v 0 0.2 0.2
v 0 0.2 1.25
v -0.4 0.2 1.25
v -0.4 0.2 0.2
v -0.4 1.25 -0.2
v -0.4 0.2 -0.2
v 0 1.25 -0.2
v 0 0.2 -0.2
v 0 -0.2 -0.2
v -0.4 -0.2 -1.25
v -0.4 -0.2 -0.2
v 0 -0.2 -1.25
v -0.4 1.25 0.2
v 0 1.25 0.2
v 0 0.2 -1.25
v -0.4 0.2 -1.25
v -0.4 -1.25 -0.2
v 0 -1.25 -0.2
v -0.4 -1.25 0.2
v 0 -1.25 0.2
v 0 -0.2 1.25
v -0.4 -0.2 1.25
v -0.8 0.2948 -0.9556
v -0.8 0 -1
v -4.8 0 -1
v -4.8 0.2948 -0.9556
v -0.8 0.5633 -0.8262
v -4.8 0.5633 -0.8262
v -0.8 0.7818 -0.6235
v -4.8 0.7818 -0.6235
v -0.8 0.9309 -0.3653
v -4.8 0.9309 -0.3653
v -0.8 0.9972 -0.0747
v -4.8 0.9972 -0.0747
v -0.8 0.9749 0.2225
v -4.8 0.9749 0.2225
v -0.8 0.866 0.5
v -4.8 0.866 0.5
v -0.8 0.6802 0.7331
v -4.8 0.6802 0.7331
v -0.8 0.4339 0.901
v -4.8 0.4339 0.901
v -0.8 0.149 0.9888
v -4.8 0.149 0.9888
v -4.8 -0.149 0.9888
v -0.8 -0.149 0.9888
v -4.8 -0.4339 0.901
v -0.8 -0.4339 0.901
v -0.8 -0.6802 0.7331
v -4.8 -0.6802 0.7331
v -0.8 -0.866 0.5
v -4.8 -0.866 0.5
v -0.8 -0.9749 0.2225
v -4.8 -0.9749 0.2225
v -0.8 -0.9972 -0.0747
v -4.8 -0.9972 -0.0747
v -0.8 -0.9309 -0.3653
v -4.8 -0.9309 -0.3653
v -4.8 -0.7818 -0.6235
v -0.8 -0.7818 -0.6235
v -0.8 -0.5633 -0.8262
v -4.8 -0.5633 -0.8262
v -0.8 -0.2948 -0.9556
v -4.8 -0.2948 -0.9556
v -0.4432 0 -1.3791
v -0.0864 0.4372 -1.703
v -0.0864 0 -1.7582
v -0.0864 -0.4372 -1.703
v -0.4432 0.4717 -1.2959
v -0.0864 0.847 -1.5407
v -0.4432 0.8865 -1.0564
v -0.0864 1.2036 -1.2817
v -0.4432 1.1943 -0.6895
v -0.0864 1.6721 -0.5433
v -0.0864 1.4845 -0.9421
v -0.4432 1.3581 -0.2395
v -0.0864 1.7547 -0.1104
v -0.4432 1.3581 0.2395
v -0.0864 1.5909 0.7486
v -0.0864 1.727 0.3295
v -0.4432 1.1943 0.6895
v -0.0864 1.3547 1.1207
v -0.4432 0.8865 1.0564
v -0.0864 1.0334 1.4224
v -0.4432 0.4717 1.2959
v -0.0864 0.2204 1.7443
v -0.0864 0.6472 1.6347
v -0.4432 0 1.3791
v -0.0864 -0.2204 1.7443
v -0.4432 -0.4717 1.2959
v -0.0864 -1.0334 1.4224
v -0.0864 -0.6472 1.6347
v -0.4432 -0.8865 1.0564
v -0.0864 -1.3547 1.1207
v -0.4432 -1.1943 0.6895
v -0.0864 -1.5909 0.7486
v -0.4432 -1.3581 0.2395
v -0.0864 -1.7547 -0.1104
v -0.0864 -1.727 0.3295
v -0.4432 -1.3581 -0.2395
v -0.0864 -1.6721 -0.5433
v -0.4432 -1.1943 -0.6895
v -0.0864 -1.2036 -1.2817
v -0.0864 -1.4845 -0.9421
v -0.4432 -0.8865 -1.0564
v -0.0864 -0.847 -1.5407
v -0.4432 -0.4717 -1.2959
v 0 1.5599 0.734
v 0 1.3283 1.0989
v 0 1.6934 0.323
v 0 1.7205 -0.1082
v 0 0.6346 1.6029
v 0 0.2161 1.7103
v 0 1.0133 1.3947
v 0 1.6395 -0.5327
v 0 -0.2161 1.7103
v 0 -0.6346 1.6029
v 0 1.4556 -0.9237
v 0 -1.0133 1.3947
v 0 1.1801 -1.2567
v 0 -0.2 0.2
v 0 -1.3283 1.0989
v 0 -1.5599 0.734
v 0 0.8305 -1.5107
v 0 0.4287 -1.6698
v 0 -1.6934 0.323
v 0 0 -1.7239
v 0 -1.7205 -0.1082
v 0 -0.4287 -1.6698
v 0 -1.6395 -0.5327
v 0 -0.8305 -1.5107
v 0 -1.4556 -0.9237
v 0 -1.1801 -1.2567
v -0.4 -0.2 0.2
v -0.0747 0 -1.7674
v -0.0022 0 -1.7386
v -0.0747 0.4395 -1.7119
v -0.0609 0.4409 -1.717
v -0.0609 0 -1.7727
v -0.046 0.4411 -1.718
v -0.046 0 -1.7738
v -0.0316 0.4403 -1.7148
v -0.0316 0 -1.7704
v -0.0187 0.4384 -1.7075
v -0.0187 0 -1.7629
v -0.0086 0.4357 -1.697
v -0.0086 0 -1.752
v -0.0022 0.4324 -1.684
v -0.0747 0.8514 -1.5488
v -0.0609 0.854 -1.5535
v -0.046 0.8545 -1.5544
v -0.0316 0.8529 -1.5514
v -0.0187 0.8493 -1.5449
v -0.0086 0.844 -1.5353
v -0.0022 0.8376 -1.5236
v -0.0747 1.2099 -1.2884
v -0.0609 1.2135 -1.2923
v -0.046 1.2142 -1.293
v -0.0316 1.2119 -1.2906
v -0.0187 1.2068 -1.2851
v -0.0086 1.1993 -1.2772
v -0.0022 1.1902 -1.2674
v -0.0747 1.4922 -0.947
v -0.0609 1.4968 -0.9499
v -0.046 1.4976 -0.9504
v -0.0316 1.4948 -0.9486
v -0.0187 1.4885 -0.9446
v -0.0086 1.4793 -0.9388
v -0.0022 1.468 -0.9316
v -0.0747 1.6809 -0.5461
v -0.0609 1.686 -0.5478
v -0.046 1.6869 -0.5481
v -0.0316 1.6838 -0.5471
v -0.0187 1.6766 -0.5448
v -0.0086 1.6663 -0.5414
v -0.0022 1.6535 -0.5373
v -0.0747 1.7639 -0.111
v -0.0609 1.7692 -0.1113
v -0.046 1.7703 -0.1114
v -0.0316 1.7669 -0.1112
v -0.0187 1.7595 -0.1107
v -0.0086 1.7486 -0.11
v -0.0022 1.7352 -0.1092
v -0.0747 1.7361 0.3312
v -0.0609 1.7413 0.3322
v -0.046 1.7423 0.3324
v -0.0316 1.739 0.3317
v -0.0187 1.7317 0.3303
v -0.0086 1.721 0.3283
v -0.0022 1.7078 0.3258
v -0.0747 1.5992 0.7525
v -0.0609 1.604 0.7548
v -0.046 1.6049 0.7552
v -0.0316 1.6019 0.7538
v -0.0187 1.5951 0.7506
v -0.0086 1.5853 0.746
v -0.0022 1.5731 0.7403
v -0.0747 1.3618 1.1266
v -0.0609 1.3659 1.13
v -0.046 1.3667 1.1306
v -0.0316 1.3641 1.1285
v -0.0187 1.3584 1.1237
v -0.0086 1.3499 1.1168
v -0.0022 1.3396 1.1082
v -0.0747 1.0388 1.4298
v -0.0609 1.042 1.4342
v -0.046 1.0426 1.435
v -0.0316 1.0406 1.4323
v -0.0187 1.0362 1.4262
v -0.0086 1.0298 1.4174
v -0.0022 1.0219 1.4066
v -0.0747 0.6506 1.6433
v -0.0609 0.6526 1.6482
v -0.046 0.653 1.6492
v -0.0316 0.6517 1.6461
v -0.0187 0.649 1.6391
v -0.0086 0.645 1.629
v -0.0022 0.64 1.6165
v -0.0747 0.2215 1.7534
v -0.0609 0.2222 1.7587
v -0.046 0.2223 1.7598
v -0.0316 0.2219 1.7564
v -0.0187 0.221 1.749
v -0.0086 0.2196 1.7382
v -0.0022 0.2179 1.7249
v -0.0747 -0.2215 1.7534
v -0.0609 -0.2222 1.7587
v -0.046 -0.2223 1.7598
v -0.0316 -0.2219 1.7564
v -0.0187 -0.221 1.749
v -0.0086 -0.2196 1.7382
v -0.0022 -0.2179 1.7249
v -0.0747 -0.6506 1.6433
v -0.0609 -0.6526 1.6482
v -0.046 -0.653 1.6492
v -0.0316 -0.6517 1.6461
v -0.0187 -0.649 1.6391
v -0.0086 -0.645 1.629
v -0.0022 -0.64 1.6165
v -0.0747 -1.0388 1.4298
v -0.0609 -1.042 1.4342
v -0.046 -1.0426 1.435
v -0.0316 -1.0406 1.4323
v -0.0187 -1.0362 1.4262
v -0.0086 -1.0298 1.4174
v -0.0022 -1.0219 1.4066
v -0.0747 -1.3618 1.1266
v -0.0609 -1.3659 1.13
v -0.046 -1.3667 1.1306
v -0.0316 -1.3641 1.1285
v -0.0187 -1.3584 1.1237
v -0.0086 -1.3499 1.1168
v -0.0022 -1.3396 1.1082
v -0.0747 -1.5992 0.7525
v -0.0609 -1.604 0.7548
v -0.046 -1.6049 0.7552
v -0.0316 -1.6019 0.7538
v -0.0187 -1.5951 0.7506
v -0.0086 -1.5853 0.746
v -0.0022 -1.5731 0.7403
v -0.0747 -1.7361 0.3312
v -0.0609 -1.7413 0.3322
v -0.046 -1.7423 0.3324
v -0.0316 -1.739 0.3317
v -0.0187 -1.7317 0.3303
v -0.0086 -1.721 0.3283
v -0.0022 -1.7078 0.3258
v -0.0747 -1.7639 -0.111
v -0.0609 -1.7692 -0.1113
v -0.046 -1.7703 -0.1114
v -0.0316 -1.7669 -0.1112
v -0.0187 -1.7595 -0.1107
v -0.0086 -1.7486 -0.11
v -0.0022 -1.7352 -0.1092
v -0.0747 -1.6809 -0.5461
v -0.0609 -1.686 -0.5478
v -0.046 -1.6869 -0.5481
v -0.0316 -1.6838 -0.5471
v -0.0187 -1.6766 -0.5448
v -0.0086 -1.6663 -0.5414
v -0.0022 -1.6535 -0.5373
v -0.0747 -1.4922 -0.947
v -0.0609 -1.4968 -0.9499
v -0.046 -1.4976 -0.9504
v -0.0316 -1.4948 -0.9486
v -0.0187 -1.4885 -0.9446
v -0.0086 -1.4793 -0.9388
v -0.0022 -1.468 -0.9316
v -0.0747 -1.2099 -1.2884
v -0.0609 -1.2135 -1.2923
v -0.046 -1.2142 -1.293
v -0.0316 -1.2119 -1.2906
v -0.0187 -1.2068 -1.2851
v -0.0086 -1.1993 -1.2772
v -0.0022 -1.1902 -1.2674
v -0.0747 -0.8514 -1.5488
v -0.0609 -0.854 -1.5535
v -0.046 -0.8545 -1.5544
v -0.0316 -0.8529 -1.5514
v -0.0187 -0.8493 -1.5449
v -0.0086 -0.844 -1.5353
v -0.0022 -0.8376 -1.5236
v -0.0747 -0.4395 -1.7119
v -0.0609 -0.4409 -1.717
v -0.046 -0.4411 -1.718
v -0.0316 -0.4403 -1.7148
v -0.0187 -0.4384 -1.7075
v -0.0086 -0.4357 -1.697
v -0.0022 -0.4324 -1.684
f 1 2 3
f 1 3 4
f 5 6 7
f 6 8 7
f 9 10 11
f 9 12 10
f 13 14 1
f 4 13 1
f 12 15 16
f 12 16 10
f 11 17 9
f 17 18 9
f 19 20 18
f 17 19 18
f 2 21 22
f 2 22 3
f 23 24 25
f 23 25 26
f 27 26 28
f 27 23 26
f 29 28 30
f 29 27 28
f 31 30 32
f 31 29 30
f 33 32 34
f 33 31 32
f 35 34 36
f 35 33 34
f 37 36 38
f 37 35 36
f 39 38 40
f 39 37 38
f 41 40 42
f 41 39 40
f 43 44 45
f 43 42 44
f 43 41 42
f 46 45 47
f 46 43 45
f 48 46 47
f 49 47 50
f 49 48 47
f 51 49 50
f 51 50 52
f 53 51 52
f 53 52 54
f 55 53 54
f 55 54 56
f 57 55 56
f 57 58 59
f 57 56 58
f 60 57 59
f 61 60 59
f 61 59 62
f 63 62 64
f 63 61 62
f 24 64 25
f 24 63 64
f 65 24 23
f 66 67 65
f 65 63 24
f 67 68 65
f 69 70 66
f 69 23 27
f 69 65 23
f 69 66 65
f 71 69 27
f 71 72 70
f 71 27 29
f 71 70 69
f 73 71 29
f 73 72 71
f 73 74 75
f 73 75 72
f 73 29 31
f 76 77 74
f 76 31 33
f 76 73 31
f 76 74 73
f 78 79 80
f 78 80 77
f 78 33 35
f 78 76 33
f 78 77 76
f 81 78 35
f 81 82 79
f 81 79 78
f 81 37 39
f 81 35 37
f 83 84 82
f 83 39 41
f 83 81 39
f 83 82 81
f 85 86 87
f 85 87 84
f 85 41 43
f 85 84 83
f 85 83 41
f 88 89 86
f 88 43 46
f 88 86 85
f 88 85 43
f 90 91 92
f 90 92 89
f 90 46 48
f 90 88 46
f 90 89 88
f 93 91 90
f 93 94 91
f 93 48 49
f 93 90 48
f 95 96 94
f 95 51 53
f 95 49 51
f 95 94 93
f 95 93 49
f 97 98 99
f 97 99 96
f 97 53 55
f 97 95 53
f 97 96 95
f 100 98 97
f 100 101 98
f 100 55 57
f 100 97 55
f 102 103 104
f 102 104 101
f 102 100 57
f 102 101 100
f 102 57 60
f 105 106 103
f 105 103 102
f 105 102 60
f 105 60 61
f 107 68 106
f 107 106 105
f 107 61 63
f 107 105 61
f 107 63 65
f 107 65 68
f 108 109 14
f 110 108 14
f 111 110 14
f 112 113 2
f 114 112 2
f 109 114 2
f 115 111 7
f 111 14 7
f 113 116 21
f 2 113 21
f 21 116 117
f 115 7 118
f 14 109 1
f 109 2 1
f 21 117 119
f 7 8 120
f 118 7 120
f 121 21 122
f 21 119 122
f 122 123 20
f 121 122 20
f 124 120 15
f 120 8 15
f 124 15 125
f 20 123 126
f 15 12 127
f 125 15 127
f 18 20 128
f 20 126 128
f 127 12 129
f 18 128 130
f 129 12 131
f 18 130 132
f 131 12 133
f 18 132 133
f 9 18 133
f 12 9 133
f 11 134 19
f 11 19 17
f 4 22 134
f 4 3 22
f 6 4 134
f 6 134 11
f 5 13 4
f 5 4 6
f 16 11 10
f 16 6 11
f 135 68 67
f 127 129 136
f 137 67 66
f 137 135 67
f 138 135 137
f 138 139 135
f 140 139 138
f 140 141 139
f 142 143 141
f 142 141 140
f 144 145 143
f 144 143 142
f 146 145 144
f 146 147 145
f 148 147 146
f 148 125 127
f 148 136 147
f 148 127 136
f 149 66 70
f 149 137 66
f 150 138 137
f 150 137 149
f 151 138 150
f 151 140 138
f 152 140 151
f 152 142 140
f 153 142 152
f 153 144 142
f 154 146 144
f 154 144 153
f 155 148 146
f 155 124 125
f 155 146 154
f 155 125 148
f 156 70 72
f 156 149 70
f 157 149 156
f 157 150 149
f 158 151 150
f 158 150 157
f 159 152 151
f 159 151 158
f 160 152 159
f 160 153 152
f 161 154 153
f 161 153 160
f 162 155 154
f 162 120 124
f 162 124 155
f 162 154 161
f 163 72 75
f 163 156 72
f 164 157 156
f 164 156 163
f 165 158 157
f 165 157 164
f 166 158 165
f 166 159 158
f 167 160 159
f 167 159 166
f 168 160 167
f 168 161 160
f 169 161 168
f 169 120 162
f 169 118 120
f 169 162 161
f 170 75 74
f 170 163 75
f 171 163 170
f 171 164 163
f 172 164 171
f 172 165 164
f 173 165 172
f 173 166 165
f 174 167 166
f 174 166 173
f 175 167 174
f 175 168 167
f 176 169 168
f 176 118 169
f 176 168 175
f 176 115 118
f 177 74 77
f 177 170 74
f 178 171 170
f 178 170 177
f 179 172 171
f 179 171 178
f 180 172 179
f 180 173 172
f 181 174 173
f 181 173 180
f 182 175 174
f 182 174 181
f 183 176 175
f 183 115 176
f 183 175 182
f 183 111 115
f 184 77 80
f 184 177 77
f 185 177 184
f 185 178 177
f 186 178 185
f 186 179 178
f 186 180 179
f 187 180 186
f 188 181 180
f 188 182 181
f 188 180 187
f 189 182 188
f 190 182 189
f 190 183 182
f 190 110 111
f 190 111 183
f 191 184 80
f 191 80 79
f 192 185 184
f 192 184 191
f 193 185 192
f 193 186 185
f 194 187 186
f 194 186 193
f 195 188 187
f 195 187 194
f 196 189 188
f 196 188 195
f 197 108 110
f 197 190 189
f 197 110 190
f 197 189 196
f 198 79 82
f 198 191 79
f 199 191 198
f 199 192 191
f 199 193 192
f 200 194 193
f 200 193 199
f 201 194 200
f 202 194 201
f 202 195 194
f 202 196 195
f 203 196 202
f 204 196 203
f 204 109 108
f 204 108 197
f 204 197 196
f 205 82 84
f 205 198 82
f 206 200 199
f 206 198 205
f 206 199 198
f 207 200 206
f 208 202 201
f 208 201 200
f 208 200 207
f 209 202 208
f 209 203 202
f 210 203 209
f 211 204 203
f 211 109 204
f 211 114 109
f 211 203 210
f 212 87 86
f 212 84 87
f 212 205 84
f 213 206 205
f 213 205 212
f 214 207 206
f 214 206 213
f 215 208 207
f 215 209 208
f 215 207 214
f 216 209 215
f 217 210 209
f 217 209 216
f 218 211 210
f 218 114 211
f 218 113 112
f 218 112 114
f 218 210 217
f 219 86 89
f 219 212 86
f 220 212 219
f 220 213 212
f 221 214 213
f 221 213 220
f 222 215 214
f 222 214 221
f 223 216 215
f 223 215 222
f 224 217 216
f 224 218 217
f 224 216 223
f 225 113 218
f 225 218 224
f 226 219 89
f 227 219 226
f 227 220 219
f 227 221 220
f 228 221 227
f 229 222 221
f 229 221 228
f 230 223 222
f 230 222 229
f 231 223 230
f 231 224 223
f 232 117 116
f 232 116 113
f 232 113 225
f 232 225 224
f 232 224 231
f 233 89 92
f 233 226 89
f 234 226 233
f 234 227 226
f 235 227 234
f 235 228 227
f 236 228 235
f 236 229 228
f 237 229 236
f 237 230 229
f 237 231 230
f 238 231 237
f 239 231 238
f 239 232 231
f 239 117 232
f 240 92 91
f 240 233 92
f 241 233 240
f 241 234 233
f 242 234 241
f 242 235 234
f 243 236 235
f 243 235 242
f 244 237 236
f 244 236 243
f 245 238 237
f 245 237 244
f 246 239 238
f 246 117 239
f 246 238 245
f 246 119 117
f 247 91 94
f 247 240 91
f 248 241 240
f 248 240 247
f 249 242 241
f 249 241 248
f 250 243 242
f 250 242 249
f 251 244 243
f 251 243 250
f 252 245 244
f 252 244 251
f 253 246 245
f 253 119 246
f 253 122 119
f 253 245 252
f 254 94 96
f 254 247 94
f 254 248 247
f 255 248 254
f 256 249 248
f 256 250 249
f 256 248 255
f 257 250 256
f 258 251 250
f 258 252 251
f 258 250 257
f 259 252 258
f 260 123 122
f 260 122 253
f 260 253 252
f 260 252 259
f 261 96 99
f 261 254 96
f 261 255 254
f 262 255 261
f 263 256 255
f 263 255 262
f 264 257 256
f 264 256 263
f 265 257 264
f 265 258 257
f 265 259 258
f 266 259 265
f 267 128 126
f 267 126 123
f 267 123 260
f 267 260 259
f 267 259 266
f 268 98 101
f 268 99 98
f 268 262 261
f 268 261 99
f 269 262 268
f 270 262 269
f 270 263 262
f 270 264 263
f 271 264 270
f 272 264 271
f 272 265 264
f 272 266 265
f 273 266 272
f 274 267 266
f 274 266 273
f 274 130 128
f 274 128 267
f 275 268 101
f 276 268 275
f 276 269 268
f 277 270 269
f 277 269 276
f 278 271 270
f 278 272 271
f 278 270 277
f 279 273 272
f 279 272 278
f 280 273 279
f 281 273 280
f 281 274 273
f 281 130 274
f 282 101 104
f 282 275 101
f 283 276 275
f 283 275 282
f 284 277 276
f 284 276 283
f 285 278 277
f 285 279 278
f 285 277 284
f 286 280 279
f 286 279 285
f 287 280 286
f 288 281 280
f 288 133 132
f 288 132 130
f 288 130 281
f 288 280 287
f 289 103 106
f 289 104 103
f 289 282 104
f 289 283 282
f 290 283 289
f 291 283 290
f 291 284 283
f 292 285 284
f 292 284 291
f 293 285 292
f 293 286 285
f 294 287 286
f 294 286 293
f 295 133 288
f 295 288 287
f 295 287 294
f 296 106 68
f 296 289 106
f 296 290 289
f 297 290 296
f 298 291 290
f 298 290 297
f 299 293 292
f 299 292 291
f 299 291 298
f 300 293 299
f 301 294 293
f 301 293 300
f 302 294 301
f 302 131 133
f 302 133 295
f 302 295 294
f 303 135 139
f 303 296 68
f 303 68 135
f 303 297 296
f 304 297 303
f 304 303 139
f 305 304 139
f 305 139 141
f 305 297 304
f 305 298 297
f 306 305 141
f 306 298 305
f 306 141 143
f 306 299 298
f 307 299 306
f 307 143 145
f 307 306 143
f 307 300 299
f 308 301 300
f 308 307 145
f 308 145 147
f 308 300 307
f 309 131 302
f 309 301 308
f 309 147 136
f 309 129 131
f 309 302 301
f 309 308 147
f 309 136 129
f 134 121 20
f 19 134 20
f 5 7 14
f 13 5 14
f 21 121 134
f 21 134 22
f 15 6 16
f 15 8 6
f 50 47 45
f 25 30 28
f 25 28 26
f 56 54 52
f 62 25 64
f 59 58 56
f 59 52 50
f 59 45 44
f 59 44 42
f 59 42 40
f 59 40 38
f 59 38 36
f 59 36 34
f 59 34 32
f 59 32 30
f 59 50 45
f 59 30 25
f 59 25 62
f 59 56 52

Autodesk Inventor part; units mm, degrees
ref_plane "YZ Plane" through (0, 0, 0) normal (1, 0, 0) x (0, 1, 0)
ref_plane "XZ Plane" through (0, 0, 0) normal (0, 1, 0) x (-1, 0, 0)
ref_plane "XY Plane" through (0, 0, 0) normal (0, 0, 1) x (1, 0, 0)
sketch "Sketch1" plane through (0, 0, 0) normal (0, 1, 0) x (-1, 0, 0)
  line L0 (0, 0) -> (0, -1.85)
  line L1 (0, 0) -> (0.8, 0)
  line L2 (0.8, 0) -> (4.8, 0)
  line L3 (4.8, 0) -> (4.8, -1)
  line L4 (4.8, -1) -> (0.8, -1)
  line L5 (0.8, -1) -> (0.8, 0)
  line L6 (0.8, -1) -> (0, -1.85)
  dimension "d0" = 1.85
  dimension "d1" = 0.8
  dimension "d2" = 4
  dimension "d3" = 1
revolve "Revolution1" add sketch "Sketch1" angle 360 about axis through (-0.8, 0, 0) along (-1, 0, 0)
fillet "Fillet1" radius 0.05 1 edges at (0, 0, 1.85)
sketch "Sketch2" plane through (0, 0, 0) normal (1, 0, 0) x (0, 0, -1)
  circle A0 centre (0, 0) radius 1.7239 projected
  line L0 (-1.25, -0.2) -> (-1.25, 0.2)
  line L1 (-1.25, 0.2) -> (1.25, 0.2)
  line L2 (1.25, 0.2) -> (1.25, -0.2)
  line L3 (1.25, -0.2) -> (-1.25, -0.2)
  line L4 (-1.25, -0.2) -> (1.25, 0.2) construction
  line L5 (-1.25, 0.2) -> (1.25, -0.2) construction
  line L6 (-0.2, -1.25) -> (0.2, -1.25)
  line L7 (0.2, -1.25) -> (0.2, 1.25)
  line L8 (0.2, 1.25) -> (-0.2, 1.25)
  line L9 (-0.2, 1.25) -> (-0.2, -1.25)
  line L10 (-0.2, -1.25) -> (0.2, 1.25) construction
  line L11 (0.2, -1.25) -> (-0.2, 1.25) construction
  point P0 (-0.2, -0.2)
  point P1 (0.2, -0.2)
  point P2 (0.2, 0.2)
  point P3 (-0.2, 0.2)
  dimension "d6" = 0.4
  dimension "d7" = 2.5
  dimension "d8" = 0.4
  dimension "d9" = 2.5
extrude "Extrusion1" cut sketch "Sketch2" against normal blind 0.4 contours L0 L1 L9 L3 | L9 L1 L7 L3 | L3 L7 L6 L9 | L9 L8 L7 L1 | L7 L1 L2 L3
properties part number "screw_2_4"
